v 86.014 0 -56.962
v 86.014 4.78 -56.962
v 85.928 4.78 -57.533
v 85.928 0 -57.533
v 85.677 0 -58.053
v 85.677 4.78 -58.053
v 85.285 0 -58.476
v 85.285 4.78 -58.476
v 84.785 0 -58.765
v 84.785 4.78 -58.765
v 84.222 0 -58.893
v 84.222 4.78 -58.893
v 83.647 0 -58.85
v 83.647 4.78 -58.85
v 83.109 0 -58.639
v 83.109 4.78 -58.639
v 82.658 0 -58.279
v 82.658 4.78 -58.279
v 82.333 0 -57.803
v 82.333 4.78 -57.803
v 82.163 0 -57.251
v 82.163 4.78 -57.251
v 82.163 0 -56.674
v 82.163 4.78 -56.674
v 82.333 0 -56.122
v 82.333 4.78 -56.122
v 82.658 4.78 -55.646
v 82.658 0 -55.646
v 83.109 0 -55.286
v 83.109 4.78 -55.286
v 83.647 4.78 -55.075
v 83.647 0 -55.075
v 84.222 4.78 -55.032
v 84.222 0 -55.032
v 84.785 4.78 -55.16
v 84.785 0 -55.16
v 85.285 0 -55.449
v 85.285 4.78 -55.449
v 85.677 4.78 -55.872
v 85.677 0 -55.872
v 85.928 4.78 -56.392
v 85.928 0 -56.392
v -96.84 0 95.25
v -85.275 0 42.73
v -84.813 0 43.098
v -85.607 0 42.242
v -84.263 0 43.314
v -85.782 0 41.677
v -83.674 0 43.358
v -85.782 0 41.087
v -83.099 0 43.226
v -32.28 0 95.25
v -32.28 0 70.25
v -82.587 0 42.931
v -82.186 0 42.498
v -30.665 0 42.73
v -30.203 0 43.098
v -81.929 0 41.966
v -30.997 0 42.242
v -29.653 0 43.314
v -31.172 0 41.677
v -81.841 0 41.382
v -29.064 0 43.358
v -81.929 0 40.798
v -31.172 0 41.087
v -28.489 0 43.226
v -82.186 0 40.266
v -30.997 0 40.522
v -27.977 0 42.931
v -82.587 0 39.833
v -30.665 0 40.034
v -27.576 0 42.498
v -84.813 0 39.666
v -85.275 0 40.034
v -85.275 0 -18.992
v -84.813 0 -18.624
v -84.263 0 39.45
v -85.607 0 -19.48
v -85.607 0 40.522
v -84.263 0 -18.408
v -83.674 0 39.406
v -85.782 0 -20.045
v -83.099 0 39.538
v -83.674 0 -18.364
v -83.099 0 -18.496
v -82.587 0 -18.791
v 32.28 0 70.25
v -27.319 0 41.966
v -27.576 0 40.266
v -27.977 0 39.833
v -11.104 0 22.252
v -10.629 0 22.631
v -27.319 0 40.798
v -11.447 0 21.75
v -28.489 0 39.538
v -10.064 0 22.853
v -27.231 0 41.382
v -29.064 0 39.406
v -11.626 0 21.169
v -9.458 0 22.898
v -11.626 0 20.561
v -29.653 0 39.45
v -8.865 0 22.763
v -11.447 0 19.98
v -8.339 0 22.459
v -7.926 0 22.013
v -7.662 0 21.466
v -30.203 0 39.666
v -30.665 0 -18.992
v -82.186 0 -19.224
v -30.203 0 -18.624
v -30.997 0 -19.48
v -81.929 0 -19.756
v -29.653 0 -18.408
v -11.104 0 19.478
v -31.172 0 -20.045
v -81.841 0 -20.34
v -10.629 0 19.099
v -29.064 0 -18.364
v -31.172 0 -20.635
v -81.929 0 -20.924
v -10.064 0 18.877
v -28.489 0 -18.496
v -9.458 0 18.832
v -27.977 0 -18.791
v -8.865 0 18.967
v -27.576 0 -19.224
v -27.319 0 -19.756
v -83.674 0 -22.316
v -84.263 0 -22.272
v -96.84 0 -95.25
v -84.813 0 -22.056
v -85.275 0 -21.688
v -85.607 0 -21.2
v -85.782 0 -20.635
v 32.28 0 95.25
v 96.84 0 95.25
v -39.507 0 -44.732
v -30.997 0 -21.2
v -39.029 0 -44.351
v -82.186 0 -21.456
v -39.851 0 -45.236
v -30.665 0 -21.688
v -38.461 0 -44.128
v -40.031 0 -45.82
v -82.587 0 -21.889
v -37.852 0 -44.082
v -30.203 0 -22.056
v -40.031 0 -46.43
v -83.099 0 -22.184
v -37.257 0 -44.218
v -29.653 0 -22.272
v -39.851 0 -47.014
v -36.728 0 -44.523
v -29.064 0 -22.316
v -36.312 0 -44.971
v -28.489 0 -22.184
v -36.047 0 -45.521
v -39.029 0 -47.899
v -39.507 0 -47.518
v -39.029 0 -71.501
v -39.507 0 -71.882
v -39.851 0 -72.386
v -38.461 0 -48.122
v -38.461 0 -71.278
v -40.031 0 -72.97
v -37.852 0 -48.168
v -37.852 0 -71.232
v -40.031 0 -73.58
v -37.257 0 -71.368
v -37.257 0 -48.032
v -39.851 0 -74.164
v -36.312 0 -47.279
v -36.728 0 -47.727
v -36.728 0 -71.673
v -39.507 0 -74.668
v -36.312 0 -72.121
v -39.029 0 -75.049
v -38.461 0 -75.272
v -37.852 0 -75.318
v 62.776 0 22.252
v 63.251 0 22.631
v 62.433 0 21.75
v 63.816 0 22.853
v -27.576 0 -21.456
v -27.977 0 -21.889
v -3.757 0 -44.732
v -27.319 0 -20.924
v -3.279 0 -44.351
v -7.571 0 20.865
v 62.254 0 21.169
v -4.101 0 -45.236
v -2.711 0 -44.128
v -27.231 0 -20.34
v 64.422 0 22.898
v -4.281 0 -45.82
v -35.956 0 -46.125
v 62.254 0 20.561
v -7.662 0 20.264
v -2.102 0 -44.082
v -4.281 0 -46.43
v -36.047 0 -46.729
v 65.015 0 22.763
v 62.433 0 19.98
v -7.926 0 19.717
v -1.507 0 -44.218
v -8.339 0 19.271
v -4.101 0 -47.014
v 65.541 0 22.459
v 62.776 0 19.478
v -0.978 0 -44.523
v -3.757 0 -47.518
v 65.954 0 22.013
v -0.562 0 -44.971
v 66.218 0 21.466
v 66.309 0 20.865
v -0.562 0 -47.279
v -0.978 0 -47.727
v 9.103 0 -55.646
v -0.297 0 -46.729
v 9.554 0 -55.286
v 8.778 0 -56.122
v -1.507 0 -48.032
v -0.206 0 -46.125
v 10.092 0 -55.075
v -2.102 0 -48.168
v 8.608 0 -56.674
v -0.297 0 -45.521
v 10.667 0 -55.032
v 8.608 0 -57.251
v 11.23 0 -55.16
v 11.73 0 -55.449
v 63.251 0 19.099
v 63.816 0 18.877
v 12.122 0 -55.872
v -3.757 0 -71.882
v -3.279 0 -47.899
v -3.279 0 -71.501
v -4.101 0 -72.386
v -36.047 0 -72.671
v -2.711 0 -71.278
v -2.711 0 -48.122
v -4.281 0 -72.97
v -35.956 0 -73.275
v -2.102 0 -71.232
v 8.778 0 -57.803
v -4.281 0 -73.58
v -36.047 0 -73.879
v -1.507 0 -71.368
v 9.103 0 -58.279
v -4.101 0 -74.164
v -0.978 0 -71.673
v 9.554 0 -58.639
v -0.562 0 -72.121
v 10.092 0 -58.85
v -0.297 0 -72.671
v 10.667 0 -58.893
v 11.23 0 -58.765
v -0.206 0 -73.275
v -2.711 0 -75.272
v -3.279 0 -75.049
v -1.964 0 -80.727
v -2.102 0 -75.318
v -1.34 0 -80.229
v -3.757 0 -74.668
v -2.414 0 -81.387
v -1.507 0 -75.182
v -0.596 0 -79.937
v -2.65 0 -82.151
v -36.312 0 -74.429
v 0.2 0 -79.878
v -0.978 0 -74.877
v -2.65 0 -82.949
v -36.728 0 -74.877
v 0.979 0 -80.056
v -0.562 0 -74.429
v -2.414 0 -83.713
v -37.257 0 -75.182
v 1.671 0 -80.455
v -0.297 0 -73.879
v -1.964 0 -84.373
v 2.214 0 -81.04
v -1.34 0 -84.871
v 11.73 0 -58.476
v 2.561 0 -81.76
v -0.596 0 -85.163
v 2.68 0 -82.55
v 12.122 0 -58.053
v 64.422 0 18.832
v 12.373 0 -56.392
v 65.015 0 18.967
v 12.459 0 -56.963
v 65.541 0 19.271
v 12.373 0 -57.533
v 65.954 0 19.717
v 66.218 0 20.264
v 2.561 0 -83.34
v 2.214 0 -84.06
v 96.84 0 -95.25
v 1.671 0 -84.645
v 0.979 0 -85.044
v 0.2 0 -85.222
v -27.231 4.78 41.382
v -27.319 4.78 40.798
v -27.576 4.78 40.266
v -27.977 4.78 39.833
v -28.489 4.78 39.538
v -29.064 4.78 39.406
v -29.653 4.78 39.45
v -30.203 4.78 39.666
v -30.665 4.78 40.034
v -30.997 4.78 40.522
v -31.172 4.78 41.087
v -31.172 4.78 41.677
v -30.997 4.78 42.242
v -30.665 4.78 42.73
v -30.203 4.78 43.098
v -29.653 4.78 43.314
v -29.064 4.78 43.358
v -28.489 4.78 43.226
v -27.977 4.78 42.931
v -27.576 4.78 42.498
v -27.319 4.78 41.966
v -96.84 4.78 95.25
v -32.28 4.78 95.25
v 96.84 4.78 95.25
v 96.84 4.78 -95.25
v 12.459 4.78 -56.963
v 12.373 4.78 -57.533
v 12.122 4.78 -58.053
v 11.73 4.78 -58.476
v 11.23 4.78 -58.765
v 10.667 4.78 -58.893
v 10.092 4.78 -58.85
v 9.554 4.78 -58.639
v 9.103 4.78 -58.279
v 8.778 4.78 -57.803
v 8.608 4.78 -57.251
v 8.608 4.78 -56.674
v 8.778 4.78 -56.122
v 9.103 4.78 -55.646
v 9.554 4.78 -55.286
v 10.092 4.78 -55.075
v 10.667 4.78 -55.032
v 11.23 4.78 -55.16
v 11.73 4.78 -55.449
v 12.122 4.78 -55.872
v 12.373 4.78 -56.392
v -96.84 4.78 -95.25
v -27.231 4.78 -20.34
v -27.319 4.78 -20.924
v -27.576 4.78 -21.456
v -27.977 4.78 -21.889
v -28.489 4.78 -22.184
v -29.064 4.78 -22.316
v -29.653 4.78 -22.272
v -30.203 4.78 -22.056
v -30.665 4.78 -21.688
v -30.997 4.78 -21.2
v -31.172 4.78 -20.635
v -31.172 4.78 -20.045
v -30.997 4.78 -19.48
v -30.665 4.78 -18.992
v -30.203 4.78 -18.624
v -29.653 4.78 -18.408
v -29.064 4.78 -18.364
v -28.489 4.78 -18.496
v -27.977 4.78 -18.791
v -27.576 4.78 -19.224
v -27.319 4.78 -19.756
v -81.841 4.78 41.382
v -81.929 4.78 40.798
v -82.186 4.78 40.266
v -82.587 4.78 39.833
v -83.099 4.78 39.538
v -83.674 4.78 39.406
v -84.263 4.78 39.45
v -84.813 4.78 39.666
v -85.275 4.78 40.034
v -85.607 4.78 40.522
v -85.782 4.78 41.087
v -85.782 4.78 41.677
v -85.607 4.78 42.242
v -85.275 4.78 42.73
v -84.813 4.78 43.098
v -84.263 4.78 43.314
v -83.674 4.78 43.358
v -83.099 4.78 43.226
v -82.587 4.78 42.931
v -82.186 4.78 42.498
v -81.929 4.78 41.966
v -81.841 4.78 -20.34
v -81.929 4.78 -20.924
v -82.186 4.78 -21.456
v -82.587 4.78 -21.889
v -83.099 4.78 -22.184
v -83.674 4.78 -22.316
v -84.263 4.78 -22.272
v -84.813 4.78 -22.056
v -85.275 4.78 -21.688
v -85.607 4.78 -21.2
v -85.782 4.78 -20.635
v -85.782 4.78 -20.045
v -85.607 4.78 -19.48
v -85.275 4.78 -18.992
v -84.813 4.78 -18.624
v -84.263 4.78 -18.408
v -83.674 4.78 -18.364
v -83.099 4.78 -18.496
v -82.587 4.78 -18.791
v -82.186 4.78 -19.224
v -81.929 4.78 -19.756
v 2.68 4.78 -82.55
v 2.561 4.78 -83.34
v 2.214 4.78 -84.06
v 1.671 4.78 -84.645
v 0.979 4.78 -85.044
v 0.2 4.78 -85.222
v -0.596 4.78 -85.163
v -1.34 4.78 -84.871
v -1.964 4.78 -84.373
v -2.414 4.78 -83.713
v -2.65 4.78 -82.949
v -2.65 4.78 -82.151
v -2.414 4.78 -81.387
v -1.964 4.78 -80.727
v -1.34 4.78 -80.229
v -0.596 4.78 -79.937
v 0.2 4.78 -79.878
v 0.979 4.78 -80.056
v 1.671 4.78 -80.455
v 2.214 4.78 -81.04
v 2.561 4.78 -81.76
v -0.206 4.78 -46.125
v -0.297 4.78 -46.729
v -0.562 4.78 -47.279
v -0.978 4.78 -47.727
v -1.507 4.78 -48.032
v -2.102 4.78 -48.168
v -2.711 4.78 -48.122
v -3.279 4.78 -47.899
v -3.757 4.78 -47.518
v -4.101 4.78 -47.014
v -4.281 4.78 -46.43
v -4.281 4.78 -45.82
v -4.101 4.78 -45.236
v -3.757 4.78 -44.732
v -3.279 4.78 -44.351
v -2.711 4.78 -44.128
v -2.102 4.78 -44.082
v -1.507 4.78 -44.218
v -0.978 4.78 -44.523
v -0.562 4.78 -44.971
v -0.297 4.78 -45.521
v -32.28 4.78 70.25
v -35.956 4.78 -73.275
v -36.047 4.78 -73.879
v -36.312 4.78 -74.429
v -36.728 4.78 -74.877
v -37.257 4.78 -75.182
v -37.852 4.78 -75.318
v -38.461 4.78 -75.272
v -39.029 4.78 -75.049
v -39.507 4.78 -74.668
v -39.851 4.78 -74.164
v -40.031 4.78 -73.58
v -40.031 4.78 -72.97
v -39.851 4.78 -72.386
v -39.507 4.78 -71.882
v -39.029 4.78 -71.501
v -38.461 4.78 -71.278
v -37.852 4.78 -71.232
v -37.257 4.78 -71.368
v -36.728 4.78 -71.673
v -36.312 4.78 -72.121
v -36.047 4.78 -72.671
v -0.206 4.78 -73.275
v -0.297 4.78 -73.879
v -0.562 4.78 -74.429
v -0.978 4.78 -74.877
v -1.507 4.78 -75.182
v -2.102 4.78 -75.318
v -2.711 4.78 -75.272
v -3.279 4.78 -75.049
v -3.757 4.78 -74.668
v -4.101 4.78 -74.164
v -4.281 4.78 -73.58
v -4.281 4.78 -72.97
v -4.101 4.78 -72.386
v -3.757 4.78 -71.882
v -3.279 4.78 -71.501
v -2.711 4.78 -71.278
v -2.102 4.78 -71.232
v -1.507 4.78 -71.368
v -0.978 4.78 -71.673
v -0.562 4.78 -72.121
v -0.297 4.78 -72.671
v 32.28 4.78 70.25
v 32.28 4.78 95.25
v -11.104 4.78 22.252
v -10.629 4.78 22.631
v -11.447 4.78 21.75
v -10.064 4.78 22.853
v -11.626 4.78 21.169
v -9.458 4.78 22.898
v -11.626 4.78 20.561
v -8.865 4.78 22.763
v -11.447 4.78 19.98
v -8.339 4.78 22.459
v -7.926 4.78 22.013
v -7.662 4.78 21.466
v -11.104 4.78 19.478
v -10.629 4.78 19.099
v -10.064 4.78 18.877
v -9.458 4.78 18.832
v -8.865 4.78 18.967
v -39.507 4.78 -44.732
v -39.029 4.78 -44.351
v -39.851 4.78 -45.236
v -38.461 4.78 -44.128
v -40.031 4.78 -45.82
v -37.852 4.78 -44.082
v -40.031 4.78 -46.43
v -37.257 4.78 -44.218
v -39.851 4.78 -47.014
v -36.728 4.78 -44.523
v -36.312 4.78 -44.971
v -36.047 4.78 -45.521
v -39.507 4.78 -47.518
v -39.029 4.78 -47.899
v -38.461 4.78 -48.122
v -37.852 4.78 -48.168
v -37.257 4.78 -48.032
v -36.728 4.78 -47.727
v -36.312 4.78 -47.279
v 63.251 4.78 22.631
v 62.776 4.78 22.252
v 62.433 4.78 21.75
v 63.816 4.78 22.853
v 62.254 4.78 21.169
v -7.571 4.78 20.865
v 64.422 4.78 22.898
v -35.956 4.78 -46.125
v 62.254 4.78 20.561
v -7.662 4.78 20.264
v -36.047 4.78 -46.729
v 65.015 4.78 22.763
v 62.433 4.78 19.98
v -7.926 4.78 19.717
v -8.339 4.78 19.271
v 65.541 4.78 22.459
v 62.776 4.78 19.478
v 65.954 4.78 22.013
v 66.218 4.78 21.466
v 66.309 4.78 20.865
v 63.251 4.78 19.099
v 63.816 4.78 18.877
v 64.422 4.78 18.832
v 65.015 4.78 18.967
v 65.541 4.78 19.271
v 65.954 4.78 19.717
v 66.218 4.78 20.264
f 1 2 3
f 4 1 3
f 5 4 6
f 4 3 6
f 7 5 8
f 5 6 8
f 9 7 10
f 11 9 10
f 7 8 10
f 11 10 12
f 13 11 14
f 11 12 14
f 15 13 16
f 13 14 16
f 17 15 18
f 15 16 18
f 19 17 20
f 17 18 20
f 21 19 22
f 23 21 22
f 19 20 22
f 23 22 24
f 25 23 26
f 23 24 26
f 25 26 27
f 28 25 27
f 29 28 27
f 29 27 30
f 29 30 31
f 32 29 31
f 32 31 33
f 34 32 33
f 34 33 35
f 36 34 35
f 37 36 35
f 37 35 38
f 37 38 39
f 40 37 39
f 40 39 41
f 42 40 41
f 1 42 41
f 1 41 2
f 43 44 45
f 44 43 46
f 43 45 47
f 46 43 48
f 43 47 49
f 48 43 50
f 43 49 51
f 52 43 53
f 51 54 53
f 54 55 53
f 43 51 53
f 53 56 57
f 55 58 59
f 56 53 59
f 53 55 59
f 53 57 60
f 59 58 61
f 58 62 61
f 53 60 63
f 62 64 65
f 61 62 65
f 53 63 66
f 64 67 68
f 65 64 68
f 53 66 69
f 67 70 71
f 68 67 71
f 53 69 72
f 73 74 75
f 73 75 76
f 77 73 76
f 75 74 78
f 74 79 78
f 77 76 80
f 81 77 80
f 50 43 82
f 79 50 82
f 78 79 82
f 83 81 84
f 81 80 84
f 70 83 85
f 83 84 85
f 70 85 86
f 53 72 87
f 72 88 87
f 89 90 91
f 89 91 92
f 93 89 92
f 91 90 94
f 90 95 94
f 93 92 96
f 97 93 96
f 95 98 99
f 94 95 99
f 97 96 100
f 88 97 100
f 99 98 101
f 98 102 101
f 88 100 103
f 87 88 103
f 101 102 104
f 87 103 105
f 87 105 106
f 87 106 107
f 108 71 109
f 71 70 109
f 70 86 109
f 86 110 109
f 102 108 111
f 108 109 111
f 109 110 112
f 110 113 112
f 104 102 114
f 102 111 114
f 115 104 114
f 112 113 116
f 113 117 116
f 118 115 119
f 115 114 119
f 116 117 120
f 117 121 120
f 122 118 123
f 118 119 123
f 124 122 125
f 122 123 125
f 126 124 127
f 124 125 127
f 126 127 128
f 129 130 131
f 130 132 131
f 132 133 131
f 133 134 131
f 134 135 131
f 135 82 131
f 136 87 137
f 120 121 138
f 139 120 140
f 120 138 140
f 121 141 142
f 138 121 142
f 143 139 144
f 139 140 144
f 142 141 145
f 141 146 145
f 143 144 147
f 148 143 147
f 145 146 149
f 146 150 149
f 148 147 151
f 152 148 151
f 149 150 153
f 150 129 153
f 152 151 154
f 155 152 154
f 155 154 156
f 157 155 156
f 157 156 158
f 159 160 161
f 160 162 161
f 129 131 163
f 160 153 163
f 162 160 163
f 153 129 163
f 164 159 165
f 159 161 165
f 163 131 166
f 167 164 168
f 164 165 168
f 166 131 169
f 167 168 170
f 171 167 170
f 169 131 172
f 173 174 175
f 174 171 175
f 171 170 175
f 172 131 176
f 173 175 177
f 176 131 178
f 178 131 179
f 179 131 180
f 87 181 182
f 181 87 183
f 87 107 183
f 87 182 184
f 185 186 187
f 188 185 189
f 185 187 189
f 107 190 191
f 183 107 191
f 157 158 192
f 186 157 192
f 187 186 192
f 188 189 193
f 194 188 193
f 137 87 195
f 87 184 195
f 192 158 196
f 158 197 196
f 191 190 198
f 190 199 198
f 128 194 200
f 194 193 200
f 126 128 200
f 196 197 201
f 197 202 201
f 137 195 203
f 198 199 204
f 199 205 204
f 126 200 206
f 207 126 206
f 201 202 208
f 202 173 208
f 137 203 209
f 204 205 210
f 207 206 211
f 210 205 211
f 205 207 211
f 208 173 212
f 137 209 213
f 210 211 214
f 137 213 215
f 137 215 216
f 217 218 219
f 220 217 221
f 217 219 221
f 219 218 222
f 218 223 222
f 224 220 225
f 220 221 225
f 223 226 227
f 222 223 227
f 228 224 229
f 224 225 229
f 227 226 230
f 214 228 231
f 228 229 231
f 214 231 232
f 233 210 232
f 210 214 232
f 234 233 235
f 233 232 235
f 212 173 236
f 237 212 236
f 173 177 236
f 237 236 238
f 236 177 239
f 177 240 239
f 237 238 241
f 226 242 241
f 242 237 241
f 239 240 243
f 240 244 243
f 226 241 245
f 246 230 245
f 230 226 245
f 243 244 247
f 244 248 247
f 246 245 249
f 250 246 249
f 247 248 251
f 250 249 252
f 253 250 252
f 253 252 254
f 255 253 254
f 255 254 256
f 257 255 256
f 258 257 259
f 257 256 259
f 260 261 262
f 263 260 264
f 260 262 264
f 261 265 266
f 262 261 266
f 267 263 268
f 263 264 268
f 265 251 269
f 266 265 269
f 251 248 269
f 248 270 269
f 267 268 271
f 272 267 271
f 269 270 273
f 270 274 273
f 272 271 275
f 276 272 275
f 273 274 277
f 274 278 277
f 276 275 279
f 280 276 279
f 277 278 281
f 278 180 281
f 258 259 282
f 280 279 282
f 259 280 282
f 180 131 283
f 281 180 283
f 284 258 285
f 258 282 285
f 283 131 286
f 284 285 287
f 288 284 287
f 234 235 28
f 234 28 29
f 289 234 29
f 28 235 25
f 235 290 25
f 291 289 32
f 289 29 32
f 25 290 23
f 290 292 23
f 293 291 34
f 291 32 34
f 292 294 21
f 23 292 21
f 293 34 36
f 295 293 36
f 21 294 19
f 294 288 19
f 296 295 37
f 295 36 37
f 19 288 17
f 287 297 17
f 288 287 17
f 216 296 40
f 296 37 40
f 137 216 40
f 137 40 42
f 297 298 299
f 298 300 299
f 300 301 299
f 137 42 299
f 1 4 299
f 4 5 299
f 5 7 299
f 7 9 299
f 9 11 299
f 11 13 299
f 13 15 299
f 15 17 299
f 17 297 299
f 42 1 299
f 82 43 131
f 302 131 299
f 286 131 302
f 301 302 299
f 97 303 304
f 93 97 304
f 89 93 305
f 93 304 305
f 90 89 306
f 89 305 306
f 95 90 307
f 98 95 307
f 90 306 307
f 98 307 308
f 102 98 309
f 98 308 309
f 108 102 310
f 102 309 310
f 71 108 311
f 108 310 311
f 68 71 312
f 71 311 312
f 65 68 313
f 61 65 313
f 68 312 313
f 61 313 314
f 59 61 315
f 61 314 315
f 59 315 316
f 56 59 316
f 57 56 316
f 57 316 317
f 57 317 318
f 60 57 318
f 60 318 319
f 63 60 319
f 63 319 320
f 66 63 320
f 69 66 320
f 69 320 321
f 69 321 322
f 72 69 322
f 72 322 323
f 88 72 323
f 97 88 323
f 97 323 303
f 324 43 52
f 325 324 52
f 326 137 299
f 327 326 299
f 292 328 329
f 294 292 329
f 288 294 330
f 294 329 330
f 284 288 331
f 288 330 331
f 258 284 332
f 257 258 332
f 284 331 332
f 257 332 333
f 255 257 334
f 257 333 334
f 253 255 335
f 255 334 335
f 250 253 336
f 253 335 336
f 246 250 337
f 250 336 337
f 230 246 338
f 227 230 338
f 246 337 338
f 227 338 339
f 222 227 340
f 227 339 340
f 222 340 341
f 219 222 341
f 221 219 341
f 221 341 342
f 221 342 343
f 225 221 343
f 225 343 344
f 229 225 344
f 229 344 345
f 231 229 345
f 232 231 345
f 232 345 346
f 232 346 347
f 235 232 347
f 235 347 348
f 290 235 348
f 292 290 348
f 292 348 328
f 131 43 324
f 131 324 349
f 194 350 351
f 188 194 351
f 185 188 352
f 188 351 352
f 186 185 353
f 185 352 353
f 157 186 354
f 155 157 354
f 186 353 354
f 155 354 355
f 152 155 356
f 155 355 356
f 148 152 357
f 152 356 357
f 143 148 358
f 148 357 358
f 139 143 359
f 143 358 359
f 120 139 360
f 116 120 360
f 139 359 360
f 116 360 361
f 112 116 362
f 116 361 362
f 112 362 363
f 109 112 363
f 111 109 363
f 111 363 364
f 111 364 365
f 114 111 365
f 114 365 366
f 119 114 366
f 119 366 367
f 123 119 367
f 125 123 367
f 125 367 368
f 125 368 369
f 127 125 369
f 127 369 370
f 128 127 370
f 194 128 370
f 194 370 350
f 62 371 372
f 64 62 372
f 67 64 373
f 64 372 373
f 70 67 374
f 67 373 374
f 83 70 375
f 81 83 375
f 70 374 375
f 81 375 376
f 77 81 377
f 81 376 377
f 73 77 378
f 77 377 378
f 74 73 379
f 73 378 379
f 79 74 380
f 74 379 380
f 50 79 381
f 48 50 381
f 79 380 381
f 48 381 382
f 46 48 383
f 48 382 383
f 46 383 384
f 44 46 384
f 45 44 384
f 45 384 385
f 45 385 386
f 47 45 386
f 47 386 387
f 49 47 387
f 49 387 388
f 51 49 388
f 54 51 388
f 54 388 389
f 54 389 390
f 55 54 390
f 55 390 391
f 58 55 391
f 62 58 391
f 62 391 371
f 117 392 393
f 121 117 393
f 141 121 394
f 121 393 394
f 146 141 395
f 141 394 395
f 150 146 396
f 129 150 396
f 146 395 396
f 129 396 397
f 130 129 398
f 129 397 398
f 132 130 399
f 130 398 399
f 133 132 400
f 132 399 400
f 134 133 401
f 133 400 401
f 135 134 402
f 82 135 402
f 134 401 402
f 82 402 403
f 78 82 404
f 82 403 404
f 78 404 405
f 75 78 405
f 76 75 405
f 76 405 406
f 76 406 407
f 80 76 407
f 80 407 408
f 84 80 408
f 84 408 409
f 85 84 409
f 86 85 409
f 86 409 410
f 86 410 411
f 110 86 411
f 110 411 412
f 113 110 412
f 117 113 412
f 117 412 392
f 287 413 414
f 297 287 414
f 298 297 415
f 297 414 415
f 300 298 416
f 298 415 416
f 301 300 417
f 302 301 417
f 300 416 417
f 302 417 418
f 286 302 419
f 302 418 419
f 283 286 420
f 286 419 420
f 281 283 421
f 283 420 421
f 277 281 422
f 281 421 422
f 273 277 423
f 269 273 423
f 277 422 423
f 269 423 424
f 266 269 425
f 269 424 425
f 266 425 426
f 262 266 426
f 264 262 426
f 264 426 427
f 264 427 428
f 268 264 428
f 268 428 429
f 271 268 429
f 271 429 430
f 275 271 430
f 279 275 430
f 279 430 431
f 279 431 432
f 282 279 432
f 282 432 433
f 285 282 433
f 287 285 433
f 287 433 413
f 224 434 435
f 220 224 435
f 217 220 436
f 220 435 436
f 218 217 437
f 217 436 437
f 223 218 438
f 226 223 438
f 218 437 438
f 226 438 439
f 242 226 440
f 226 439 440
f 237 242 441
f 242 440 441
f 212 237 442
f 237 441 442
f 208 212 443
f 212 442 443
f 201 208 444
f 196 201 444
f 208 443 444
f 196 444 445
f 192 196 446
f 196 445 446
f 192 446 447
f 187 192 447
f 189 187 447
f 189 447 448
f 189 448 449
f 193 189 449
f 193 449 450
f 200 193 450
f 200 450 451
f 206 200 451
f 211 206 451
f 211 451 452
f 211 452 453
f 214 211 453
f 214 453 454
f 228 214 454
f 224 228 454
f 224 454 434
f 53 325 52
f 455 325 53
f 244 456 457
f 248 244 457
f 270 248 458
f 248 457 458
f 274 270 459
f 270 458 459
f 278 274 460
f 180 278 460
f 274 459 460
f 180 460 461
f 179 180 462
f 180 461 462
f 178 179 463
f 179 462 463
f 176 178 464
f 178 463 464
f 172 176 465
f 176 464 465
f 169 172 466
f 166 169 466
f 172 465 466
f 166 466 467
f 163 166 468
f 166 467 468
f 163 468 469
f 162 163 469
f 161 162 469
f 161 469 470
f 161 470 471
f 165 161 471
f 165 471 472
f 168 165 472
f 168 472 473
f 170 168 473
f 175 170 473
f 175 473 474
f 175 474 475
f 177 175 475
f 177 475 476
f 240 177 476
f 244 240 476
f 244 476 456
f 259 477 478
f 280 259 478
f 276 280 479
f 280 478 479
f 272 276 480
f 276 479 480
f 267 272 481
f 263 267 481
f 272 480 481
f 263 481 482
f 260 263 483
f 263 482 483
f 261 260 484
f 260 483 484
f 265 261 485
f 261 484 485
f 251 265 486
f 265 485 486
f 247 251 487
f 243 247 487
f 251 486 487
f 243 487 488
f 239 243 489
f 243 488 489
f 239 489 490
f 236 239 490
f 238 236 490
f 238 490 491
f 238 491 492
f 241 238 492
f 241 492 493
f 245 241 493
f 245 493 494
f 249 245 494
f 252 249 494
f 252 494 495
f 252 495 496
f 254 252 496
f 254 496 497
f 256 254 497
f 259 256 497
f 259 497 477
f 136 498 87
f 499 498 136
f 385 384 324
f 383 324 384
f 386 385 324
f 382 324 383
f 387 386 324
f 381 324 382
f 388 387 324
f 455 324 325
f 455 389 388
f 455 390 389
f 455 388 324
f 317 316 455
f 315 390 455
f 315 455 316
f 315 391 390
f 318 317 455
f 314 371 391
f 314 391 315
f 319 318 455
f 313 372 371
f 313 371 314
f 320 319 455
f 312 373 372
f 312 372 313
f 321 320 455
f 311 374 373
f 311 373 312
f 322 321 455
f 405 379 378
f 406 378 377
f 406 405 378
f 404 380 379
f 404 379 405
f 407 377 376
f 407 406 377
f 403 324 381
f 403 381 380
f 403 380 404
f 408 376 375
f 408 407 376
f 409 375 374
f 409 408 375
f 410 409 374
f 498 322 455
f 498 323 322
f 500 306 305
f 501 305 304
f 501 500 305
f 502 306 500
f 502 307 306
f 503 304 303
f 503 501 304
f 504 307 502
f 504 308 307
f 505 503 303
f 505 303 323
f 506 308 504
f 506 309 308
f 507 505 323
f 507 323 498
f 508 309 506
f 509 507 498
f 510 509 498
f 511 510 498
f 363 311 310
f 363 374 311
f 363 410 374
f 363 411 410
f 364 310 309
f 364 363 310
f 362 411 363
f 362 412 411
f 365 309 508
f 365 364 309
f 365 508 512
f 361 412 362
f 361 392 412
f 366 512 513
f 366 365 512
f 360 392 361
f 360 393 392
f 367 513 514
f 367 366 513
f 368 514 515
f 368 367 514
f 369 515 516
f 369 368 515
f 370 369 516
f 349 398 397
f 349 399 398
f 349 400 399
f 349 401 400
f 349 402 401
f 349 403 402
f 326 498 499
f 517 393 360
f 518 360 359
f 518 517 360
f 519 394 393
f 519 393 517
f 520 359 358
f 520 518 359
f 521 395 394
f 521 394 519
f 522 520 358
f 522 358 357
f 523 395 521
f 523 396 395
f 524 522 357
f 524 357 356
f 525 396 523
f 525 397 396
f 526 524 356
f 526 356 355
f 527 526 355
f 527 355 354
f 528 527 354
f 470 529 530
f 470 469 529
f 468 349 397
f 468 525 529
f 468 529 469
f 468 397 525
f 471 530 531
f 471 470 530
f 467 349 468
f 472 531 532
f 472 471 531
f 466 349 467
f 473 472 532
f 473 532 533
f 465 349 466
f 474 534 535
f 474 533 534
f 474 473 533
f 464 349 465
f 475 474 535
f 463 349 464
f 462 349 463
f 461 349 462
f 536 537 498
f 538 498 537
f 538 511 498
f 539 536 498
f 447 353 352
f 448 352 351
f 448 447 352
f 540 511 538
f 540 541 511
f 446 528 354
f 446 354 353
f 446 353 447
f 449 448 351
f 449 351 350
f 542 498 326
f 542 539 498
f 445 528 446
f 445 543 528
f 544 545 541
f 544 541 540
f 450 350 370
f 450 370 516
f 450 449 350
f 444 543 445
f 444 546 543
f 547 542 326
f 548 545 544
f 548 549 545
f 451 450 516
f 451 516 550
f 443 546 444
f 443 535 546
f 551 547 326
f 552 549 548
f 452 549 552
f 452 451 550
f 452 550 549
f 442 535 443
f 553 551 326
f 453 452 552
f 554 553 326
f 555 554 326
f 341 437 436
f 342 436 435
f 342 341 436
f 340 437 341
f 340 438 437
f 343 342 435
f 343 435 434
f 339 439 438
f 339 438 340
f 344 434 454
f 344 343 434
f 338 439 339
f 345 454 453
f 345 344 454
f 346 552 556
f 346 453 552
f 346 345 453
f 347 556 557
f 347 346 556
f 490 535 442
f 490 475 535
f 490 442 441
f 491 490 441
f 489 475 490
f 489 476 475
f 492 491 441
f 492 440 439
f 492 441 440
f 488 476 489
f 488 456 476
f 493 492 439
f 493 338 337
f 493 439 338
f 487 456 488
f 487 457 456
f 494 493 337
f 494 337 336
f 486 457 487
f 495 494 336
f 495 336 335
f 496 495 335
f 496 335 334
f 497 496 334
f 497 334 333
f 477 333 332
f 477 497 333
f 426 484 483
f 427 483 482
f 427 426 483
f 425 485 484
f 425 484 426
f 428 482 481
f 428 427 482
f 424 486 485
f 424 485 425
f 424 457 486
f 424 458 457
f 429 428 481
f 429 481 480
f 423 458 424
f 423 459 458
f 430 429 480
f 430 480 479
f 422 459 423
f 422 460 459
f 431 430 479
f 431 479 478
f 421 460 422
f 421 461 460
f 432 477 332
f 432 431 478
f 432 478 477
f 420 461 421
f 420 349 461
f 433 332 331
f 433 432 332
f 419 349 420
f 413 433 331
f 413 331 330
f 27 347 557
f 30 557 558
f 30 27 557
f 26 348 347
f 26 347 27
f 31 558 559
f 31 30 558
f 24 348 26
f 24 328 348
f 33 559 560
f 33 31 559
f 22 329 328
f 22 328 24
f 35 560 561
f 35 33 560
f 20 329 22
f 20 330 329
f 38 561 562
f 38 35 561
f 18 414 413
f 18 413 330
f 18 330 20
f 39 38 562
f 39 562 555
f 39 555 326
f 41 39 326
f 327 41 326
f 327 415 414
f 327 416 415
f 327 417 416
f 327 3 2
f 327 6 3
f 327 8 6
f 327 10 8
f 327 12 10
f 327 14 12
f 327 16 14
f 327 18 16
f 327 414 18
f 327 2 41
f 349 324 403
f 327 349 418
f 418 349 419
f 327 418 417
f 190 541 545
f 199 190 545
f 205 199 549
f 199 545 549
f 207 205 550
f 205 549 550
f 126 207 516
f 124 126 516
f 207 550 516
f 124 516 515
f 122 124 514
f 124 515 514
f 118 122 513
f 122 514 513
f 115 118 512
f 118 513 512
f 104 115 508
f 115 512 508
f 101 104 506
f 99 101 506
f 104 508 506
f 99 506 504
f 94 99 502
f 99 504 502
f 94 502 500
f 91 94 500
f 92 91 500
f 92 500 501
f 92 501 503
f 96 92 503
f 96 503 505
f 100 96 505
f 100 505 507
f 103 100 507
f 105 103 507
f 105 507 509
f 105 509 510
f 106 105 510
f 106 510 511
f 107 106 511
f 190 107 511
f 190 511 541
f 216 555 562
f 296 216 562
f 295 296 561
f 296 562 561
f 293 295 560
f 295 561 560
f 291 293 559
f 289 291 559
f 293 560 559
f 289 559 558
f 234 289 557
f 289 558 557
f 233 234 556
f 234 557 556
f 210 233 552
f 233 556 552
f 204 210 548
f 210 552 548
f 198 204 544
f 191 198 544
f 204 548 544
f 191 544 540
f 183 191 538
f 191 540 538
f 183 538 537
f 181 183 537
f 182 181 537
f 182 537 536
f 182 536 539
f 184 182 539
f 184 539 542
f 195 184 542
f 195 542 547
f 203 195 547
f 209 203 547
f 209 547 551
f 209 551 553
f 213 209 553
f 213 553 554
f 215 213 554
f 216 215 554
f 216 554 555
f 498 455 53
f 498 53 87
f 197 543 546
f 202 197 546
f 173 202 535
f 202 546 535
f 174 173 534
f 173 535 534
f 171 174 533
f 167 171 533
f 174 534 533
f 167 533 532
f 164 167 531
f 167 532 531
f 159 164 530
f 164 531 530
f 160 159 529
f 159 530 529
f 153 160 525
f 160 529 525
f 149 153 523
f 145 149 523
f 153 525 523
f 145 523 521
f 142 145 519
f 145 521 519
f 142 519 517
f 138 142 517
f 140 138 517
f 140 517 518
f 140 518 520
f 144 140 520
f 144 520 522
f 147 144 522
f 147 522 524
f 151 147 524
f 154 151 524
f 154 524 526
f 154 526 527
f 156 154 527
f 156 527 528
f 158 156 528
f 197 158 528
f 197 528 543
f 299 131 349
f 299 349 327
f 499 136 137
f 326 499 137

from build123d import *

# Parameters (mm, degrees)
SKETCH1_W           = 193.68
SKETCH1_H           = 190.5
BOSS_EXTRUDE1_DEPTH = 4.78
SKETCH2_R           = 2.6797
CUT_EXTRUDE1_DEPTH  = 5.78
CUT_EXTRUDE2_DEPTH  = 5.78
SKETCH4_R           = 1.936199963
SKETCH4_R_2         = 2.048699992
SKETCH4_R_3         = 1.9812
SKETCH4_R_4         = 2.038700012
CUT_EXTRUDE3_DEPTH  = 5.78


with BuildPart() as part:
    # Sketch1 → Boss-Extrude1 (new body)
    with BuildSketch(Plane(origin=(0, 0, 0), x_dir=(1, 0, 0), z_dir=(0, 1, 0))):
        Rectangle(SKETCH1_W, SKETCH1_H)
    extrude(amount=BOSS_EXTRUDE1_DEPTH)

    # Sketch2 → Cut-Extrude1 (cut, through all)
    with BuildSketch(Plane(origin=(0, 4.78, 0), x_dir=(1, 0, 0), z_dir=(0, 1, 0))):
        with Locations((0, 82.55)):
            Circle(SKETCH2_R)
    extrude(amount=-CUT_EXTRUDE1_DEPTH, mode=Mode.SUBTRACT)

    # Sketch3 → Cut-Extrude2 (cut, through all)
    with BuildSketch(Plane(origin=(0, 4.78, 0), x_dir=(1, 0, 0), z_dir=(0, 1, 0))):
        Polygon((0, -95.25), (-32.28, -95.25), (-32.28, -70.249999962), (32.28, -70.249999962), (32.28, -95.25), align=None)
    extrude(amount=-CUT_EXTRUDE2_DEPTH, mode=Mode.SUBTRACT)

    # Sketch4 → Cut-Extrude3 (cut, through all)
    with BuildSketch(Plane(origin=(0, 4.78, 0), x_dir=(1, 0, 0), z_dir=(0, 1, 0))):
        with Locations((10.5225, 56.962500062)):
            Circle(SKETCH4_R)
        with Locations((84.0775, 56.9625)):
            Circle(SKETCH4_R)
        with Locations((-38.005, 73.274999999)):
            Circle(SKETCH4_R_2)
        with Locations((-2.255, 73.275)):
            Circle(SKETCH4_R_2)
        with Locations((-2.255, 46.125)):
            Circle(SKETCH4_R_2)
        with Locations((-38.005, 46.125000001)):
            Circle(SKETCH4_R_2)
        with Locations((-83.8225, -41.381999999)):
            Circle(SKETCH4_R_3)
        with Locations((-83.822499999, 20.340000001)):
            Circle(SKETCH4_R_3)
        with Locations((-29.212499999, 20.34)):
            Circle(SKETCH4_R_3)
        with Locations((-29.2125, -41.382)):
            Circle(SKETCH4_R_3)
        with Locations((64.27, -20.864999962)):
            Circle(SKETCH4_R_4)
        with Locations((-9.61, -20.864999962)):
            Circle(SKETCH4_R_4)
    extrude(amount=-CUT_EXTRUDE3_DEPTH, mode=Mode.SUBTRACT)


solid = part.part
